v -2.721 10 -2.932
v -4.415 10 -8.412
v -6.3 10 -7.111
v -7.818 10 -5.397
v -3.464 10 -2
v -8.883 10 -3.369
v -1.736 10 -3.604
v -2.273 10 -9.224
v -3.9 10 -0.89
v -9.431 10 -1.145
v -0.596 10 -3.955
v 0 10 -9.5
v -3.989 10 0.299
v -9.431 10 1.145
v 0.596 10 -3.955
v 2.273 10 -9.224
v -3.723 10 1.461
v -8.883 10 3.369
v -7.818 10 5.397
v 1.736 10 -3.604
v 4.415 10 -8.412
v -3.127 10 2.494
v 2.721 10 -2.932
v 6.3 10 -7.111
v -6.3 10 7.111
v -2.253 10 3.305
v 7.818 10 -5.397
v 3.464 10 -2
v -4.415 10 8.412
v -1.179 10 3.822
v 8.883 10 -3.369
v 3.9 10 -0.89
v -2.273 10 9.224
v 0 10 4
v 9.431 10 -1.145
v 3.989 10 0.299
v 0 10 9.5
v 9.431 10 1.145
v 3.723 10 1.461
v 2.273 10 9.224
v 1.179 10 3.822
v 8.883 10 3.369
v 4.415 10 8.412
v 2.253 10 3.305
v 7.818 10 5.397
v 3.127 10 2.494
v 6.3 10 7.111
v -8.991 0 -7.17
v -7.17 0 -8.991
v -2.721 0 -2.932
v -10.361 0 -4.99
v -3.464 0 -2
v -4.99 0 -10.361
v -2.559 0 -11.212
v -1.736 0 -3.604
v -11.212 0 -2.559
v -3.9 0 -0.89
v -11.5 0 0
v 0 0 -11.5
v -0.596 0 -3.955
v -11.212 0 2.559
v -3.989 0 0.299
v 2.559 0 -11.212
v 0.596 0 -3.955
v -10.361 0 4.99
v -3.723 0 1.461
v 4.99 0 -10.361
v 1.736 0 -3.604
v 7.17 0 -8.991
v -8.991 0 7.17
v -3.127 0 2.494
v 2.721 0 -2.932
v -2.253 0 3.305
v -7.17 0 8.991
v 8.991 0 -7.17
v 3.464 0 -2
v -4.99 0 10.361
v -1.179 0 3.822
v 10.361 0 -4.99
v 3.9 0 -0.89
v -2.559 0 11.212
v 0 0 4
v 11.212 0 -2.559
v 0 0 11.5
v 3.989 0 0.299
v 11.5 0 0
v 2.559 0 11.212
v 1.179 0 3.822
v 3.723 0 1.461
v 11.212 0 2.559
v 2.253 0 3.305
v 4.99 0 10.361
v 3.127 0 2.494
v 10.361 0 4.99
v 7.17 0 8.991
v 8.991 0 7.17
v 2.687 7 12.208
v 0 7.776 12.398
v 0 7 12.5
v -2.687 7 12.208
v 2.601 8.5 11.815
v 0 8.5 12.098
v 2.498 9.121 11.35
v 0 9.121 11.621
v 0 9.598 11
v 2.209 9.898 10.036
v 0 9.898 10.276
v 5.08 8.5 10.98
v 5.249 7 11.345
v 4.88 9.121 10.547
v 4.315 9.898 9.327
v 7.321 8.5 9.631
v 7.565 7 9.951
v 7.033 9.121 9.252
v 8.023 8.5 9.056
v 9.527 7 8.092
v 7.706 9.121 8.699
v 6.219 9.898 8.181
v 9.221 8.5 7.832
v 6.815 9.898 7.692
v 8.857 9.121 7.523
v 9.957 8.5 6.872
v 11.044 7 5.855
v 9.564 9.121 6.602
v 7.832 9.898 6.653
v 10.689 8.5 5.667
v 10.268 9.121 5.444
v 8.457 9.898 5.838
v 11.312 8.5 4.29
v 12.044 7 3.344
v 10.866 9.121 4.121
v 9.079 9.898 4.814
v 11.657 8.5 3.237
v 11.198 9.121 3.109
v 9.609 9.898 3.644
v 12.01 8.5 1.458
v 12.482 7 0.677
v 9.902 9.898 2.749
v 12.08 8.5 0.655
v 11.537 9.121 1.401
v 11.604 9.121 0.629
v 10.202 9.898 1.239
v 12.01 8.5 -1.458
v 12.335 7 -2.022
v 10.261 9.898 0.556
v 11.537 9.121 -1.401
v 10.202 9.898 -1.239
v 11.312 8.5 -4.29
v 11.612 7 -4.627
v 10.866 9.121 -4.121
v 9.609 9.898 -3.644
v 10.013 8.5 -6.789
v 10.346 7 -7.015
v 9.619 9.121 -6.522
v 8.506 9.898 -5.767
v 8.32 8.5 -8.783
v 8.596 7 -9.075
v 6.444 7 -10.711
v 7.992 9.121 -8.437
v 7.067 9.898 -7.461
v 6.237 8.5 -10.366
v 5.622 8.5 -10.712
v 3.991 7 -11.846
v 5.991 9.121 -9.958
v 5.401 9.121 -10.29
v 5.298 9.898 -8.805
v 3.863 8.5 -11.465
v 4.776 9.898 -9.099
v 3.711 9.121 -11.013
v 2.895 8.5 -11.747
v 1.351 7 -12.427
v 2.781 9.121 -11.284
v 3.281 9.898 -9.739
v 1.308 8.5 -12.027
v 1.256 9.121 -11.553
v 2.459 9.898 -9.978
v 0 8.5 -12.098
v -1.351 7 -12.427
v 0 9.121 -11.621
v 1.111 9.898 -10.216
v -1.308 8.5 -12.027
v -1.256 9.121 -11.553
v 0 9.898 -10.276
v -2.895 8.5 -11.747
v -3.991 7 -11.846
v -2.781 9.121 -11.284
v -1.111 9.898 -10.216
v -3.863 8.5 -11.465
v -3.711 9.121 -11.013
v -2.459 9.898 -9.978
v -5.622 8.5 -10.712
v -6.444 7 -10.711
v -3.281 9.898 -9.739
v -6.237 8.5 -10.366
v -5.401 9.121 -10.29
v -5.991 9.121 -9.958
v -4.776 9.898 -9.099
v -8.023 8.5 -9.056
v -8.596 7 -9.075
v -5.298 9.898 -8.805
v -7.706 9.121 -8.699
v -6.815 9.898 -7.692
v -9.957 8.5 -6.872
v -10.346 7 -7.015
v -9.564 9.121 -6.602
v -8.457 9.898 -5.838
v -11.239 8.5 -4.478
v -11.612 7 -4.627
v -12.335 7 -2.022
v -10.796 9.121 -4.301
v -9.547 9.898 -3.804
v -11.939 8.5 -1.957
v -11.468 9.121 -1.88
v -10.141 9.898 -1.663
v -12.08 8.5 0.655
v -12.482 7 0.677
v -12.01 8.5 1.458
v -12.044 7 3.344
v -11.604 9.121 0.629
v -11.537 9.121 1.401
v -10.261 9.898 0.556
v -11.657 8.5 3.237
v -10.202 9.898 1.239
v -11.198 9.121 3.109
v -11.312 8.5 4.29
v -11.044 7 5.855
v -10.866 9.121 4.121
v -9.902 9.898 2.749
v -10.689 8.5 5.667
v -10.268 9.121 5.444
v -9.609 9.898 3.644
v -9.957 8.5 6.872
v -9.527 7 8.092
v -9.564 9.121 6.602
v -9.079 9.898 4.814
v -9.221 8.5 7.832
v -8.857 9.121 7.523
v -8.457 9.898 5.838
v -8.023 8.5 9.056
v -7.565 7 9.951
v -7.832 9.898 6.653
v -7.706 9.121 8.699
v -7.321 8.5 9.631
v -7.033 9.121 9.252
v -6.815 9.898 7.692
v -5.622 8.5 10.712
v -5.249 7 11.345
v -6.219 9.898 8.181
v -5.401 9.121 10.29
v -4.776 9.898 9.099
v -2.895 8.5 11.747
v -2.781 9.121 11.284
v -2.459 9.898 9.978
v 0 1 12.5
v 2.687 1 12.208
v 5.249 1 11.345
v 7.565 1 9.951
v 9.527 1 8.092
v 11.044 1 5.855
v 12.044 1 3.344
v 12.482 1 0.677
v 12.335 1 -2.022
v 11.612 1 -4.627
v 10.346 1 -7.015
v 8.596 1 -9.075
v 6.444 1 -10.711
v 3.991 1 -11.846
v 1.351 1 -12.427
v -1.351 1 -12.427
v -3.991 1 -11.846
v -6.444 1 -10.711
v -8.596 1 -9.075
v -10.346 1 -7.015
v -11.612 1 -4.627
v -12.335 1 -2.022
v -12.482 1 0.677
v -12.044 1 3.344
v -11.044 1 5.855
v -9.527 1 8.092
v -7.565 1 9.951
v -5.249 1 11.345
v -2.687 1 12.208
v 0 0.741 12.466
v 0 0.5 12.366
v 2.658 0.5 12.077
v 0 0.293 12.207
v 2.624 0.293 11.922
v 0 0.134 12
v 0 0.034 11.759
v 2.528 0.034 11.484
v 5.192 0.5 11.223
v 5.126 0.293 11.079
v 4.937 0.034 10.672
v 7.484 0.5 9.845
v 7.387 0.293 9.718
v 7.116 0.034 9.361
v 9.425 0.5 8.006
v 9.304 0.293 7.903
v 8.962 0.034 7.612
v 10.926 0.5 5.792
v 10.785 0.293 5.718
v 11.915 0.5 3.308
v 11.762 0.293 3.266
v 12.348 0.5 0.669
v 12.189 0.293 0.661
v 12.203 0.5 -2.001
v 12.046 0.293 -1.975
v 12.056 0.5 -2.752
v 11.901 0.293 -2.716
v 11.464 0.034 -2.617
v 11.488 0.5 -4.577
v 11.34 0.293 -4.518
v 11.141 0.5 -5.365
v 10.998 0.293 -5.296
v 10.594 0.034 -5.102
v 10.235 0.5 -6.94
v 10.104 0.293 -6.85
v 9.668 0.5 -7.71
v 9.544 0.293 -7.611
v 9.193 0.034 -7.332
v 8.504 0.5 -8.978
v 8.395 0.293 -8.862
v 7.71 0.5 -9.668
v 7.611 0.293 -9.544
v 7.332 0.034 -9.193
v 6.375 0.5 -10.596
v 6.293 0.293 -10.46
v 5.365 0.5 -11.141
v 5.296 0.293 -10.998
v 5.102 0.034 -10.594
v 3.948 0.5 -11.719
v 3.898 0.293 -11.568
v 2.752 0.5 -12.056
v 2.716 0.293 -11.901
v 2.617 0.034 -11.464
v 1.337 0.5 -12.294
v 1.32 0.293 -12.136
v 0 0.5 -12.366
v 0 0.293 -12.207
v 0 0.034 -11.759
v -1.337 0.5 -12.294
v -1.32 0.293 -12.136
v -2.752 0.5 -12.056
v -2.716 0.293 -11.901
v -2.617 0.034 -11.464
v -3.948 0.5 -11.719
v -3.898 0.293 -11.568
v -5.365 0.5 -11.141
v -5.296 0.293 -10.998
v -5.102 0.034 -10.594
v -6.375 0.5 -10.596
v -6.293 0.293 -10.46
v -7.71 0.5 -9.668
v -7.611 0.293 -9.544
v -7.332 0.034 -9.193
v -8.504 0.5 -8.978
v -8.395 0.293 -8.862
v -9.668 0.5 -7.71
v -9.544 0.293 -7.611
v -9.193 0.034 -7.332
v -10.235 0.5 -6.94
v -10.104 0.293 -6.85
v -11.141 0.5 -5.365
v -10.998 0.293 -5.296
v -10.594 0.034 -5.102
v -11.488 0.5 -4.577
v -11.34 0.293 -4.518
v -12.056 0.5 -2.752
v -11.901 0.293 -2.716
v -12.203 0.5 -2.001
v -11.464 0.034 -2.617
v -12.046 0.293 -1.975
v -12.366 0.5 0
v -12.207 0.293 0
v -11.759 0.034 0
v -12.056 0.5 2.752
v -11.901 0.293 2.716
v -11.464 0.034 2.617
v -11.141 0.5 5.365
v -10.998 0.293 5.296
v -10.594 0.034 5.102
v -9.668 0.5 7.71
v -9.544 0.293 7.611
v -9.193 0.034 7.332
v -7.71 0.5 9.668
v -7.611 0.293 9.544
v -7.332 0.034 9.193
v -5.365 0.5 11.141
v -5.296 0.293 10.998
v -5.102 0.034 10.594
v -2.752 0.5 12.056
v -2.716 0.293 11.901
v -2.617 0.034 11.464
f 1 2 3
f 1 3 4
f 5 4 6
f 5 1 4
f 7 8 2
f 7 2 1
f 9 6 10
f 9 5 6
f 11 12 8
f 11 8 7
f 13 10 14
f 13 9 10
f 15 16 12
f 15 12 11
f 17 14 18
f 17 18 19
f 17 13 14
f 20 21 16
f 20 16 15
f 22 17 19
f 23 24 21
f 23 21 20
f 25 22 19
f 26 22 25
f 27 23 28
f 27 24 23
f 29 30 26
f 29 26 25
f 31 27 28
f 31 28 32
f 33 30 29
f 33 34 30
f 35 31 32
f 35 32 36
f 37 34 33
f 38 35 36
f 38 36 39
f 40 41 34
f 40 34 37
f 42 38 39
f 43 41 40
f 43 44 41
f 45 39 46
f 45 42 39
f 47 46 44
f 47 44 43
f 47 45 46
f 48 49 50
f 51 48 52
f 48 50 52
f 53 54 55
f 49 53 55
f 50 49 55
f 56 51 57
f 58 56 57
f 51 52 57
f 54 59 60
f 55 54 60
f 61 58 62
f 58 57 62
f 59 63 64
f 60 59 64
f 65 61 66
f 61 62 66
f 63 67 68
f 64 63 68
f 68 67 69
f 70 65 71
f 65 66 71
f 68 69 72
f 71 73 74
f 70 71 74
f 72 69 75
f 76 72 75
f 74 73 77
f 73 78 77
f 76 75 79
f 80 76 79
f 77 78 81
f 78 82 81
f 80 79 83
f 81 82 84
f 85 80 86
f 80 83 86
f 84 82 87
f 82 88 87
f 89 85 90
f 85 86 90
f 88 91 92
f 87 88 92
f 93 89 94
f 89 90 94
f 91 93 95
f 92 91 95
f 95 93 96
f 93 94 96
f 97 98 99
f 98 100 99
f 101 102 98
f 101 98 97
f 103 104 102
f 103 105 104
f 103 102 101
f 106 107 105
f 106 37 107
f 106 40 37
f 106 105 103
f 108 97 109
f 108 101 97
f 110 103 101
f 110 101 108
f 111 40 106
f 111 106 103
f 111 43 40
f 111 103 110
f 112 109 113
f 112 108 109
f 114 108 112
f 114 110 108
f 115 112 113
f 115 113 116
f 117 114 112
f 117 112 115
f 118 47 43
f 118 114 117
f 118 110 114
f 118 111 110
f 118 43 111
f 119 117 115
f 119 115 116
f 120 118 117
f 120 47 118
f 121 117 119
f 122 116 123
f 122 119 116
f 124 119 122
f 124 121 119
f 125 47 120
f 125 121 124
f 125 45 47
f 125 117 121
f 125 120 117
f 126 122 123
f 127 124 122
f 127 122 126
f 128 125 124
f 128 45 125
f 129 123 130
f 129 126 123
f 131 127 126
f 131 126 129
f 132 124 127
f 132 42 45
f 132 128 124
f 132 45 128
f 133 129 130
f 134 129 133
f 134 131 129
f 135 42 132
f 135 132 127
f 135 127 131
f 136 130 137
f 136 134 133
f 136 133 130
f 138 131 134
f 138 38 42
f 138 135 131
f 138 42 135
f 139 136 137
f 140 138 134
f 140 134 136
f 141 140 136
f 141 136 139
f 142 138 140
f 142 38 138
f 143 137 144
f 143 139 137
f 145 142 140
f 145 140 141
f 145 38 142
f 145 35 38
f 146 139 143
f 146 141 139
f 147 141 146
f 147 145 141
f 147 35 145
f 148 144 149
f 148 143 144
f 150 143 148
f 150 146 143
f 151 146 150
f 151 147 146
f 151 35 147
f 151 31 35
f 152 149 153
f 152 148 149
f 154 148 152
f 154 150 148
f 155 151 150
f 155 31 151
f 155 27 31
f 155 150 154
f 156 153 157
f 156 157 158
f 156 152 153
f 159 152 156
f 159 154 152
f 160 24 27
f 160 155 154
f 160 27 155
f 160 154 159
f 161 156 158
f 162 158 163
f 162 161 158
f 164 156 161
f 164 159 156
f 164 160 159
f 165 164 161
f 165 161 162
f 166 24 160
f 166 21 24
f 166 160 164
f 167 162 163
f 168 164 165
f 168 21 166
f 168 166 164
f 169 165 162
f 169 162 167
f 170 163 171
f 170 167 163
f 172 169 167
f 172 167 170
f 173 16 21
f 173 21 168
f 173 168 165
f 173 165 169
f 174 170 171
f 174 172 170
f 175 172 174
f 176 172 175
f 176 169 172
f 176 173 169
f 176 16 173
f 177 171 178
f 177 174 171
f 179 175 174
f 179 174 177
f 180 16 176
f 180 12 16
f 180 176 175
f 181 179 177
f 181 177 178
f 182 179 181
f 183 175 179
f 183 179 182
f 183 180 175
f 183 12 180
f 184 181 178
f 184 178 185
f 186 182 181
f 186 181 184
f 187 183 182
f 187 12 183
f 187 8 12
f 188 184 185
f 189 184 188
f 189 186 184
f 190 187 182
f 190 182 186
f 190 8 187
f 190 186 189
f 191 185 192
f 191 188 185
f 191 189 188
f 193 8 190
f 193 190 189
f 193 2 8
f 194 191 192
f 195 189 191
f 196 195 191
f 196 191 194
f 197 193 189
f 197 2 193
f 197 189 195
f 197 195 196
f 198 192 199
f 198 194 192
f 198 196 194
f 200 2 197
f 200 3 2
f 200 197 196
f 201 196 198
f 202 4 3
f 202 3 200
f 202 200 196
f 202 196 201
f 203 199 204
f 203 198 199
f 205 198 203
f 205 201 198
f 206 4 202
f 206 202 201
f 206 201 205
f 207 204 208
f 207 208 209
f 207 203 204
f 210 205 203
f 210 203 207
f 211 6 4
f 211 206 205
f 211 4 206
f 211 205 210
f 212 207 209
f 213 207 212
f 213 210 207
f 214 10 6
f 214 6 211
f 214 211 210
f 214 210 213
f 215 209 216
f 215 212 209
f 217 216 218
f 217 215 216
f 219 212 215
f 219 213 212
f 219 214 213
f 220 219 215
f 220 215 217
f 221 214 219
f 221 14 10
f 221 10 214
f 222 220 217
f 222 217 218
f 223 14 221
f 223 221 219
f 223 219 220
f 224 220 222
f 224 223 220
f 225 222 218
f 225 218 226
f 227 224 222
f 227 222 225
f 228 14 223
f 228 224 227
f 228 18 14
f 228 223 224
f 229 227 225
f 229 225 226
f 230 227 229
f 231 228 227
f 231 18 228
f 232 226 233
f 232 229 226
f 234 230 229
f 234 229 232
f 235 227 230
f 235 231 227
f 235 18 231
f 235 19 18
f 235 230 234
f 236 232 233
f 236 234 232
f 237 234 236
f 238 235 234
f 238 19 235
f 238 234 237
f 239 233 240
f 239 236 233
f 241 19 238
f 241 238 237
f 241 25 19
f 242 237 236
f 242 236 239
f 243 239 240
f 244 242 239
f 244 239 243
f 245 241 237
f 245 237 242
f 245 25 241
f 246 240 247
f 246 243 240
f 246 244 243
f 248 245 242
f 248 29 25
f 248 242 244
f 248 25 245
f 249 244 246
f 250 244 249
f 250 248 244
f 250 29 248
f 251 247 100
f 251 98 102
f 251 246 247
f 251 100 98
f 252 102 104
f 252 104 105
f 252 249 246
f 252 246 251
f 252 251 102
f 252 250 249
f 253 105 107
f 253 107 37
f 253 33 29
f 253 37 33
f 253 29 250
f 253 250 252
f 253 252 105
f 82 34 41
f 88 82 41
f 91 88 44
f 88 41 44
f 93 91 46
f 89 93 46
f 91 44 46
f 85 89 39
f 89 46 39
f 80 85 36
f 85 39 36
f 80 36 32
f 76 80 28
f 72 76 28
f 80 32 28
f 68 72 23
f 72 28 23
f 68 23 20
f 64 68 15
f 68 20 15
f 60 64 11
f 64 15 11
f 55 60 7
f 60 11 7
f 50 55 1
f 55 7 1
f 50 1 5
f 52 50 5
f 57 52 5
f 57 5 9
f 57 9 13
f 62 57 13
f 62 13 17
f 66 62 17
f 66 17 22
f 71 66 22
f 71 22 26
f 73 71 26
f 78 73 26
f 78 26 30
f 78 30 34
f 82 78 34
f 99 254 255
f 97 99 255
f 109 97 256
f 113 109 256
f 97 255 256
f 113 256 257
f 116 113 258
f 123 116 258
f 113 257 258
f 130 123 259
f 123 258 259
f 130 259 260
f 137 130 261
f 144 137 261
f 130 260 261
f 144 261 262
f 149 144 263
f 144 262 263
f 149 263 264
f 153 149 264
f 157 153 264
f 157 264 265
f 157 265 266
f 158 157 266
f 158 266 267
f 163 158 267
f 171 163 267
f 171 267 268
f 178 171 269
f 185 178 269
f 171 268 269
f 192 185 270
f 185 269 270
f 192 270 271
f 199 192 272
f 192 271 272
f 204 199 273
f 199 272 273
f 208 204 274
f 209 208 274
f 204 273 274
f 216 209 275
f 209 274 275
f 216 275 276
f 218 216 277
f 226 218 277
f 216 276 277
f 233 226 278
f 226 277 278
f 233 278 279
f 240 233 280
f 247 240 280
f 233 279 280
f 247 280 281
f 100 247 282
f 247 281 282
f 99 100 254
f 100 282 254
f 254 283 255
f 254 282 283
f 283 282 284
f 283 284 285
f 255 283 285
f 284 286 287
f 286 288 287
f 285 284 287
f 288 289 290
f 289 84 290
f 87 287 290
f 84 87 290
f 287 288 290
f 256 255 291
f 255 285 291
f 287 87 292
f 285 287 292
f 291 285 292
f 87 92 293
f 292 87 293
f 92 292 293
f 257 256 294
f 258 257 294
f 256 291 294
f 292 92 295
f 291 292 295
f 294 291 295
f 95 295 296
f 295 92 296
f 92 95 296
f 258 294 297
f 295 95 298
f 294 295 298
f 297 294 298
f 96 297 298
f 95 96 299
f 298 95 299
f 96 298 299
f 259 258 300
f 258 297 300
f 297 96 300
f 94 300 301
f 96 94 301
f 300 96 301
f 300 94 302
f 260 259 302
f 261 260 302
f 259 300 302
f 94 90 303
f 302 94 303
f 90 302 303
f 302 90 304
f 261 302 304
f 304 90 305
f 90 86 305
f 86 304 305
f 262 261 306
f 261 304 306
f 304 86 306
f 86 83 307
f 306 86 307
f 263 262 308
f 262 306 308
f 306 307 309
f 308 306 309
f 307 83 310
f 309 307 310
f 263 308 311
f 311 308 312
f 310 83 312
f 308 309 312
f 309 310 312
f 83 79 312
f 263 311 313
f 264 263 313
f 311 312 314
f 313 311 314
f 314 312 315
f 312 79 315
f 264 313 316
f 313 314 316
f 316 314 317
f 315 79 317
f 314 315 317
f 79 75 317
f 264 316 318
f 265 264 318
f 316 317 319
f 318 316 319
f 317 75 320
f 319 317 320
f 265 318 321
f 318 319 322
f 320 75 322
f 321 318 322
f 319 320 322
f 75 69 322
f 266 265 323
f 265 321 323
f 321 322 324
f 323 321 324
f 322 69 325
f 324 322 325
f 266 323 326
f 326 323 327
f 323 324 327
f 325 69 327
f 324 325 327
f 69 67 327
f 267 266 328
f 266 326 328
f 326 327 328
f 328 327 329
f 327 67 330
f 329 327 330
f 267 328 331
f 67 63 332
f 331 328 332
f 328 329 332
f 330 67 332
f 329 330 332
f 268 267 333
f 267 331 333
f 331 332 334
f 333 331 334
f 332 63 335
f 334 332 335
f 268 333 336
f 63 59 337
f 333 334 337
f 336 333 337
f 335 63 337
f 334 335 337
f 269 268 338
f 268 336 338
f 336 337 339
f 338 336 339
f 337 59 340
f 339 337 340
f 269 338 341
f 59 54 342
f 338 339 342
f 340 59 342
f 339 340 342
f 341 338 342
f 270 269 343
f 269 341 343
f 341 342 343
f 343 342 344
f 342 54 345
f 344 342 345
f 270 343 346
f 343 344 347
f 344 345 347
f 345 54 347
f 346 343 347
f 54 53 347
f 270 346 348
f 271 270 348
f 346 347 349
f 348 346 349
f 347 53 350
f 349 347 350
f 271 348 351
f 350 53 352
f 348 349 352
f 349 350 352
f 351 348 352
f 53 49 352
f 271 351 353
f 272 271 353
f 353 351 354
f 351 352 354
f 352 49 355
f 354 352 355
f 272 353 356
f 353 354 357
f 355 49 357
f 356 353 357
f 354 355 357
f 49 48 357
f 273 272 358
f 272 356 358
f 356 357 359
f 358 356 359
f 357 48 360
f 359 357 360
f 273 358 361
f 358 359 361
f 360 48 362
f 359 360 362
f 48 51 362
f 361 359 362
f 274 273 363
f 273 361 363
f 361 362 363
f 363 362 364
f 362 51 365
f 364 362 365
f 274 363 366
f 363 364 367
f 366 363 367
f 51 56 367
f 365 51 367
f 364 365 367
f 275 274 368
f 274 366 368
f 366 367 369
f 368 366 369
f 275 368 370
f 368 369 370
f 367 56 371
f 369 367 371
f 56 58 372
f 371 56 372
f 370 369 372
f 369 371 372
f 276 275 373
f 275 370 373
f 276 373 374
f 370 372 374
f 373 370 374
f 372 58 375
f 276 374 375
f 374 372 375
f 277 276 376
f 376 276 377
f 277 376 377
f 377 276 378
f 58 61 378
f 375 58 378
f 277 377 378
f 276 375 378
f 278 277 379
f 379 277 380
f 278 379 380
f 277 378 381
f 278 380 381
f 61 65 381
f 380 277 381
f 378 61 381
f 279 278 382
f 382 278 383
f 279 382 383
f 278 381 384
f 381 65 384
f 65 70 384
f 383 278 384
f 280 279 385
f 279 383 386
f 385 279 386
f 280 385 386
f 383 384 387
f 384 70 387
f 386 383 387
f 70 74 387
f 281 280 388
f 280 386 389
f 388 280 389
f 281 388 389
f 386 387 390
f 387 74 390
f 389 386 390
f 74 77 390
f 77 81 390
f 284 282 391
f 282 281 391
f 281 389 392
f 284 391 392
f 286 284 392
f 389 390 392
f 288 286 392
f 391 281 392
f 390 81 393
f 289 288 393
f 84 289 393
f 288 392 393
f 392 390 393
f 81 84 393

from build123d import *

# Parameters (mm, degrees)
SKETCH1_R           = 12.5
BOSS_EXTRUDE1_DEPTH = 10
FILLET1_R           = 3
SKETCH2_R           = 4
CUT_EXTRUDE1_DEPTH  = 21.310096012
FILLET2_R           = 1


with BuildPart() as part:
    # Sketch1 → Boss-Extrude1 (new body)
    with BuildSketch(Plane(origin=(0, 0, 0), x_dir=(1, 0, 0), z_dir=(0, 1, 0))):
        with Locations(Location((0, 0, 0), (0, 0, 270))):
            Circle(SKETCH1_R)
    extrude(amount=BOSS_EXTRUDE1_DEPTH)

    # Fillet1
    fillet1_edges = [part.edges().sort_by_distance(p)[0] for p in [
        (0, 10, -12.5),
    ]]
    fillet(fillet1_edges, radius=FILLET1_R)

    # Sketch2 → Cut-Extrude1 (cut, through all)
    with BuildSketch(Plane(origin=(0, 10, 0), x_dir=(1, 0, 0), z_dir=(0, 1, 0))):
        with Locations(Location((0, 0, 0), (0, 0, 270))):
            Circle(SKETCH2_R)
    extrude(amount=-CUT_EXTRUDE1_DEPTH, mode=Mode.SUBTRACT)

    # Fillet2
    fillet2_edges = [part.edges().sort_by_distance(p)[0] for p in [
        (0, 0, -12.5),
    ]]
    fillet(fillet2_edges, radius=FILLET2_R)


solid = part.part
